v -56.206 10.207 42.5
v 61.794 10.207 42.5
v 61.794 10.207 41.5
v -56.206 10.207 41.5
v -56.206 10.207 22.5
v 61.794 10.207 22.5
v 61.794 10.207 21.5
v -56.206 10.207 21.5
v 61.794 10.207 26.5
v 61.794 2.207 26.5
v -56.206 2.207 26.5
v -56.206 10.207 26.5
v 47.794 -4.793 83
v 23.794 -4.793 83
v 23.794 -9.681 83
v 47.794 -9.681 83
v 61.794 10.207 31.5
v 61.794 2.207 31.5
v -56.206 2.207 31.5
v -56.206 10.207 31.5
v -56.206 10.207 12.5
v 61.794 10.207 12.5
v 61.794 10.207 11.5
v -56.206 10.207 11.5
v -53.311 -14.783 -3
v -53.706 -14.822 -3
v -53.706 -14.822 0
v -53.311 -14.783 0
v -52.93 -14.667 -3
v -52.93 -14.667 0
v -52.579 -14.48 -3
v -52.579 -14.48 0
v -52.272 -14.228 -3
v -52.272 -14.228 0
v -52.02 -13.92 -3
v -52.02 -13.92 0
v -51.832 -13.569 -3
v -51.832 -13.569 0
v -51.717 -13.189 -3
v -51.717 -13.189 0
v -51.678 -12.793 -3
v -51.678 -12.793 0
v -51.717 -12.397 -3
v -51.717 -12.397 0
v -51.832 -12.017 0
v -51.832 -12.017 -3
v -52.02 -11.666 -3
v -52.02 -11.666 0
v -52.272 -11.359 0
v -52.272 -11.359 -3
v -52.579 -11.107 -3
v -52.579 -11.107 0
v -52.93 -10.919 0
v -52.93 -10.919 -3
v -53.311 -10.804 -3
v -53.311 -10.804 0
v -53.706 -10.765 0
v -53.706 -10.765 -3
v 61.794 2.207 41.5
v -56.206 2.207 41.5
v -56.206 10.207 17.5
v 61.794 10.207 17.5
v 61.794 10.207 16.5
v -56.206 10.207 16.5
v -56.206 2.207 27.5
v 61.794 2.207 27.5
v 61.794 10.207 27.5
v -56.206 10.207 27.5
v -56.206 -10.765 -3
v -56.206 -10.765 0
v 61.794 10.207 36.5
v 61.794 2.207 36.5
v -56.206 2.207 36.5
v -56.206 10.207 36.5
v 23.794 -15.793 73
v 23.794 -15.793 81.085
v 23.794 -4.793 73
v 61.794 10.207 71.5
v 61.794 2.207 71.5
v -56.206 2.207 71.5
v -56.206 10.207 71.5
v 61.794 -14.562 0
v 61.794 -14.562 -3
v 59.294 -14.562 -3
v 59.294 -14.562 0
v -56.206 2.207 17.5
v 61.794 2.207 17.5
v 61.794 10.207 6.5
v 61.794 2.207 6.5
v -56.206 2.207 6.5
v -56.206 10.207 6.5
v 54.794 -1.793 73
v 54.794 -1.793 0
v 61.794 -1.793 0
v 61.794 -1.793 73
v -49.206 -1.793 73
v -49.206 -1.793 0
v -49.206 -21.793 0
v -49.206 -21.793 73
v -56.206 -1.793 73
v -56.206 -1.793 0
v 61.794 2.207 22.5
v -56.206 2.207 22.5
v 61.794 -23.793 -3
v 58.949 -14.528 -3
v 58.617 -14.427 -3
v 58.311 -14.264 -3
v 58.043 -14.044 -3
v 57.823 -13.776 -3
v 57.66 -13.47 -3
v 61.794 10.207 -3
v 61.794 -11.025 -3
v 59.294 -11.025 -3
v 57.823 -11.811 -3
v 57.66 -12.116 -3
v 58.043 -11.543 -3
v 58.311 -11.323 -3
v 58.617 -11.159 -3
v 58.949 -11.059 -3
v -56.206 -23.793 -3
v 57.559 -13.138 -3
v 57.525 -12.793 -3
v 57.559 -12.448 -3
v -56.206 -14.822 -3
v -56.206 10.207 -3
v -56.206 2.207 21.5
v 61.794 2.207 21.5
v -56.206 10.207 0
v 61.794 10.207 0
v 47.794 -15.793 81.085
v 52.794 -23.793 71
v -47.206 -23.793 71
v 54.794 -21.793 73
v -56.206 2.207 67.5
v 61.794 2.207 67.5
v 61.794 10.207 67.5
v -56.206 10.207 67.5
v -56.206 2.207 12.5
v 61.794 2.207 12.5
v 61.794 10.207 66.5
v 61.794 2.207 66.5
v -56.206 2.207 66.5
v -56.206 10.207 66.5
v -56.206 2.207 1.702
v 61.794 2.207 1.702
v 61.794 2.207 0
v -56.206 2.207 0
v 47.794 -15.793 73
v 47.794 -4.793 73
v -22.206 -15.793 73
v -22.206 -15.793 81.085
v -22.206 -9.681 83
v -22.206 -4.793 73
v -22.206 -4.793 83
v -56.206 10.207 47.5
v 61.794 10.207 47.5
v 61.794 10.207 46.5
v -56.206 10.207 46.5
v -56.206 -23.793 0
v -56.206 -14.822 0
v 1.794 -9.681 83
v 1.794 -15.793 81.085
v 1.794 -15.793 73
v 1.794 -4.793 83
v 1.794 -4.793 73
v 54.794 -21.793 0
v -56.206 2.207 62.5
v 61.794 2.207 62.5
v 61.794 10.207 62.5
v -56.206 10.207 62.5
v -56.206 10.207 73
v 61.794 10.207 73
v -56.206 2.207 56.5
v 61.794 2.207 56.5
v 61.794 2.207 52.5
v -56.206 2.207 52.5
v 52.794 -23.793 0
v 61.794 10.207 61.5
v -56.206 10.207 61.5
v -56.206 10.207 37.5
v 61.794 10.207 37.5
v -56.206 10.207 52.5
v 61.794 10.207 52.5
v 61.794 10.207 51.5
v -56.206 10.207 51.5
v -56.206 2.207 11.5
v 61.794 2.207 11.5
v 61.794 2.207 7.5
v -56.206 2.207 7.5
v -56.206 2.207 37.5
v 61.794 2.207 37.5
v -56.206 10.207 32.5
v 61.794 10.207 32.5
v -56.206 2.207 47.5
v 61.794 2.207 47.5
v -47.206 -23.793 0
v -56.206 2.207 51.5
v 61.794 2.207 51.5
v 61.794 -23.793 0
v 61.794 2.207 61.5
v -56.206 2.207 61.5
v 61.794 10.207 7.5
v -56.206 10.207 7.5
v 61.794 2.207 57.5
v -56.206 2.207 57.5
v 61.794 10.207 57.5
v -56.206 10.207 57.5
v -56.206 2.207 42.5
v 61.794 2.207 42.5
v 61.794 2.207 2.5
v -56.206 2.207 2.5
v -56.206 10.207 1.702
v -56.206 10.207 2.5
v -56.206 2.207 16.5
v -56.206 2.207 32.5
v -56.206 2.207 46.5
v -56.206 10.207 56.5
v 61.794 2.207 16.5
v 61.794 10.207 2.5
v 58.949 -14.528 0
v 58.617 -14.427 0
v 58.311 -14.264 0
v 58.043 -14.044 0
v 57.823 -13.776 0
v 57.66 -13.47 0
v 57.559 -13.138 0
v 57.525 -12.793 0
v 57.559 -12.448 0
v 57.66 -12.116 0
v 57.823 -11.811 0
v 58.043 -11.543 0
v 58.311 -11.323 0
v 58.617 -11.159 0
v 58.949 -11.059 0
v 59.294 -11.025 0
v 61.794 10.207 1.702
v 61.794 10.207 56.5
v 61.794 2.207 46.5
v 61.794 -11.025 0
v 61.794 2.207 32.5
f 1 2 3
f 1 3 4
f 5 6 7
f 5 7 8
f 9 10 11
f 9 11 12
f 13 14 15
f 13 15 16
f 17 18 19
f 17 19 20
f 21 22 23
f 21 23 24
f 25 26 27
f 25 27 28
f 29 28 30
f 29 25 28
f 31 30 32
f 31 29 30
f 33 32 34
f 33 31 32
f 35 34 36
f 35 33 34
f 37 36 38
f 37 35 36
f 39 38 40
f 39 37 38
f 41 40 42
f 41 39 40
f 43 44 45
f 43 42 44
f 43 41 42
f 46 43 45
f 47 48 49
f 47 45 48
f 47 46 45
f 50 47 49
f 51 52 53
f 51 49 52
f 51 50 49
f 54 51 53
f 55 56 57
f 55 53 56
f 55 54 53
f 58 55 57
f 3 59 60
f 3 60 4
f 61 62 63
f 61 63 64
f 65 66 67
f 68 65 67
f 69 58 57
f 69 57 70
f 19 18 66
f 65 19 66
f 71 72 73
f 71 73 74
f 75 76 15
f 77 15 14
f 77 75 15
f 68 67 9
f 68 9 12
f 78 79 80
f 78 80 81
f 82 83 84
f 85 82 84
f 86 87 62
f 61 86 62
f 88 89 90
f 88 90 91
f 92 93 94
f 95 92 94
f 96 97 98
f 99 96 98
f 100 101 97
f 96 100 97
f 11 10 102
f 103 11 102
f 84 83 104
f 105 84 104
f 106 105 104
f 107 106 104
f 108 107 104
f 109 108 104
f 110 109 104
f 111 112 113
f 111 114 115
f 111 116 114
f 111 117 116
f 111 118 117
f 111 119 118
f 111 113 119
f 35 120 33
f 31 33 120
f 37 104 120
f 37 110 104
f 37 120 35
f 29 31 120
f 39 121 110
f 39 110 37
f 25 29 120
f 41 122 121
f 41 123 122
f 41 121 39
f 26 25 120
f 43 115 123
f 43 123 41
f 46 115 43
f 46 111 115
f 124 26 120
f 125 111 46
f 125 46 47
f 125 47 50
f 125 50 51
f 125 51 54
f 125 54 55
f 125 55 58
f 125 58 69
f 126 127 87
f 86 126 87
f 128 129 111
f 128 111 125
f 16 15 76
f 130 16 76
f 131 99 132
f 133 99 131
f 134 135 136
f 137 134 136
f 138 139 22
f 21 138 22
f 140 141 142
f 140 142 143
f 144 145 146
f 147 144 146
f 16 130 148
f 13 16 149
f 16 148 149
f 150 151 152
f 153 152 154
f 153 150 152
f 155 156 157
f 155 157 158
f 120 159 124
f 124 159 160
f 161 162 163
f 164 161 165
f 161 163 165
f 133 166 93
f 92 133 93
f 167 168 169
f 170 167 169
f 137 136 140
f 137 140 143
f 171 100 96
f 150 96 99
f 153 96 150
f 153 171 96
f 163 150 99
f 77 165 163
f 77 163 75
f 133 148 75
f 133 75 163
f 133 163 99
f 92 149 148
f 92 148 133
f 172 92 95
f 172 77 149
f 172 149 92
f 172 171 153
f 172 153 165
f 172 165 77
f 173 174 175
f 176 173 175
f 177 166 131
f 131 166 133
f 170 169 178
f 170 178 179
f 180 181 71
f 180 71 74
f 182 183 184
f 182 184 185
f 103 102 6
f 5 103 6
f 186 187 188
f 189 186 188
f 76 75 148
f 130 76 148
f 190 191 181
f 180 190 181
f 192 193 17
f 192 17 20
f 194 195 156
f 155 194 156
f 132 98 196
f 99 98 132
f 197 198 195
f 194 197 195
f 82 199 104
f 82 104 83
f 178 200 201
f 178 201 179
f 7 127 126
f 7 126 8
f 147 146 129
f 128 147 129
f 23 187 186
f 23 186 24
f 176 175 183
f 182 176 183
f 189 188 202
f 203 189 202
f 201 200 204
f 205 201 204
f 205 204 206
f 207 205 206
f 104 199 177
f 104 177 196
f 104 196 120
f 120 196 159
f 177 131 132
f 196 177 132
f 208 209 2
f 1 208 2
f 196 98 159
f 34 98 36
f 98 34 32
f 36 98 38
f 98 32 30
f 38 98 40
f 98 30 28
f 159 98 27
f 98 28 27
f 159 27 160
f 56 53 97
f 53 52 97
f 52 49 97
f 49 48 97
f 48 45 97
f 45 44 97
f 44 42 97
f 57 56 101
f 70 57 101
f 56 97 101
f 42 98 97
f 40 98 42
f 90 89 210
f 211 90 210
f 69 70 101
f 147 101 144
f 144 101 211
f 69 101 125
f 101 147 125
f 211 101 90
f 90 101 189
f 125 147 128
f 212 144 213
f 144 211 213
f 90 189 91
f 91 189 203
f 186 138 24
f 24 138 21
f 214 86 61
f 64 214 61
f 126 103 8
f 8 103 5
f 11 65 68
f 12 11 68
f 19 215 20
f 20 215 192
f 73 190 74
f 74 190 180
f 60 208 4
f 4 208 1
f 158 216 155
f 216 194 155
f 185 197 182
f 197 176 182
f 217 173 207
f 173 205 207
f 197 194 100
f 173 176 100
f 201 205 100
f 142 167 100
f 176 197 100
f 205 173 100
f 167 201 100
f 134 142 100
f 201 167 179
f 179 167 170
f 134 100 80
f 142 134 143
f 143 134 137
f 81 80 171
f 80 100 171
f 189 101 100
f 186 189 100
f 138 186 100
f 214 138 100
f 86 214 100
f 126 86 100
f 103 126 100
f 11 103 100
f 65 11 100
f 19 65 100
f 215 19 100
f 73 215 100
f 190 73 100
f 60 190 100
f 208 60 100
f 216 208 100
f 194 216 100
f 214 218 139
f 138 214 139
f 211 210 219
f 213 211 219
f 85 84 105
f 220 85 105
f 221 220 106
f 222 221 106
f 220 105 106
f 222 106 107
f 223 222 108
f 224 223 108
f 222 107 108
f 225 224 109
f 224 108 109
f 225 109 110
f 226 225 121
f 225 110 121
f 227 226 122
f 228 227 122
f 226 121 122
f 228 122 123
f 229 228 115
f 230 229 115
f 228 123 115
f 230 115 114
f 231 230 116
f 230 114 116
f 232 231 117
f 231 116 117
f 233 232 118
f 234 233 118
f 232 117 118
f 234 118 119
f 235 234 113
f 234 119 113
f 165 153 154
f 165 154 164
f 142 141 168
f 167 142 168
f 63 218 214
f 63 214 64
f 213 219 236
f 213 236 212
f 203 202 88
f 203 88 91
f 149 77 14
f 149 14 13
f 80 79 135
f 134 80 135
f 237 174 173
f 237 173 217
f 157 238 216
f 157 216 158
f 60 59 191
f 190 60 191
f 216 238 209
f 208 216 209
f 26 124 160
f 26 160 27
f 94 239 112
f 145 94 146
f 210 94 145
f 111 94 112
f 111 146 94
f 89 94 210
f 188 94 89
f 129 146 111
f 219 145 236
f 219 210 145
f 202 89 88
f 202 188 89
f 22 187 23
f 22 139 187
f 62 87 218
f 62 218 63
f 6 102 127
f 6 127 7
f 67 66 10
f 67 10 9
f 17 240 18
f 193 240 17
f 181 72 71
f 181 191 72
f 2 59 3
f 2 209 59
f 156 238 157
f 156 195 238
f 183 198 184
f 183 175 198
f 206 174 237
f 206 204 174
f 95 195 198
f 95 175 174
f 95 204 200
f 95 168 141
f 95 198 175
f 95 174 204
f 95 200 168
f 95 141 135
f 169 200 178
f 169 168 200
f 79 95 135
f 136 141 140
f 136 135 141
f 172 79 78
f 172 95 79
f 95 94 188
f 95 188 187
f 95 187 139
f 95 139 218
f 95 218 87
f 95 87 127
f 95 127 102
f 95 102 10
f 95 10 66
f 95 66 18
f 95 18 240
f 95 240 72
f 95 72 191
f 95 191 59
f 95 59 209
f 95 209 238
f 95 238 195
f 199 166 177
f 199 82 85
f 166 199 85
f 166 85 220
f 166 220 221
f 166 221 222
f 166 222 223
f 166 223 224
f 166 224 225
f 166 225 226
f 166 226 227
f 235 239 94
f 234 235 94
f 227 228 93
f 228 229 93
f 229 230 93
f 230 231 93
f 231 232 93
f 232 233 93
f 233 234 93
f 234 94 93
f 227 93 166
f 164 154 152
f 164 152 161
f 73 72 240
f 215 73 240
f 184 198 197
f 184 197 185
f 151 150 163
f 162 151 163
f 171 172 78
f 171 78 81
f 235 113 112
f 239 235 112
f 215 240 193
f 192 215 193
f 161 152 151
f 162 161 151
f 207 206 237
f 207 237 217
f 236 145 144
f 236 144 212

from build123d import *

# Parameters (mm, degrees)
EXTRUDE_1_DEPTH     = 73
SKETCH_2_W          = 118
SKETCH_2_H          = 34
EXTRUDE_2_DEPTH     = 3
SKETCH_3_W          = 4
SKETCH_3_H          = 8
SKETCH_3_W_2        = 1.701544984
CUT_EXTRUDE_1_DEPTH = 122
SKETCH_4_W          = 24
SKETCH_4_H          = 11
EXTRUDE_3_DEPTH     = 10
CUT_EXTRUDE_2_DEPTH = 72
CUT_EXTRUDE_3_DEPTH = 5
CHAMFER_1_SIZE      = 2


with BuildPart() as part:
    # Эскиз1 → Бобышка-Вытянуть1 (new body)
    with BuildSketch(Plane.XY):
        Polygon((-49.206262386, -23.793189369), (54.793737614, -23.793189369), (54.793737614, -1.793189369), (61.793737614, -1.793189369), (61.793737614, 10.206810631), (-56.206262386, 10.206810631), (-56.206262386, -1.793189369), (-49.206262386, -1.793189369), align=None)
    extrude(amount=EXTRUDE_1_DEPTH)

    # Эскиз2 → Бобышка-Вытянуть2 (add)
    with BuildSketch(Plane(origin=(0, 0, 0), x_dir=(-1, 0, 0), z_dir=(0, 0, -1))):
        with Locations((-2.793737614, -6.793189369)):
            Rectangle(SKETCH_2_W, SKETCH_2_H)
    extrude(amount=EXTRUDE_2_DEPTH)

    # Эскиз3 → Вырез-Вытянуть1 (cut)
    with BuildSketch(Plane(origin=(61.793737614, 0, 0), x_dir=(0, 0, -1), z_dir=(1, 0, 0))):
        with Locations((-69.5, 6.206810631)):
            Rectangle(SKETCH_3_W, SKETCH_3_H)
        with Locations((-64.5, 6.206810631)):
            Rectangle(SKETCH_3_W, SKETCH_3_H)
        with Locations((-59.5, 6.206810631)):
            Rectangle(SKETCH_3_W, SKETCH_3_H)
        with Locations((-54.5, 6.206810631)):
            Rectangle(SKETCH_3_W, SKETCH_3_H)
        with Locations((-49.5, 6.206810631)):
            Rectangle(SKETCH_3_W, SKETCH_3_H)
        with Locations((-44.5, 6.206810631)):
            Rectangle(SKETCH_3_W, SKETCH_3_H)
        with Locations((-39.5, 6.206810631)):
            Rectangle(SKETCH_3_W, SKETCH_3_H)
        with Locations((-34.5, 6.206810631)):
            Rectangle(SKETCH_3_W, SKETCH_3_H)
        with Locations((-29.5, 6.206810631)):
            Rectangle(SKETCH_3_W, SKETCH_3_H)
        with Locations((-24.5, 6.206810631)):
            Rectangle(SKETCH_3_W, SKETCH_3_H)
        with Locations((-19.5, 6.206810631)):
            Rectangle(SKETCH_3_W, SKETCH_3_H)
        with Locations((-14.5, 6.206810631)):
            Rectangle(SKETCH_3_W, SKETCH_3_H)
        with Locations((-9.5, 6.206810631)):
            Rectangle(SKETCH_3_W, SKETCH_3_H)
        with Locations((-4.5, 6.206810631)):
            Rectangle(SKETCH_3_W, SKETCH_3_H)
        with Locations((-0.850772492, 6.206810631)):
            Rectangle(SKETCH_3_W_2, SKETCH_3_H)
    extrude(amount=-CUT_EXTRUDE_1_DEPTH, mode=Mode.SUBTRACT)

    # Эскиз4 → Бобышка-Вытянуть3 (add)
    with BuildSketch(Plane.XY.offset(73)):
        with Locations((35.793737614, -10.293189369)):
            Rectangle(SKETCH_4_W, SKETCH_4_H)
        with Locations((-10.206262386, -10.293189369)):
            Rectangle(SKETCH_4_W, SKETCH_4_H)
    extrude(amount=EXTRUDE_3_DEPTH)

    # Эскиз5 → Вырез-Вытянуть2 (cut)
    with BuildSketch(Plane.ZY.offset(22.206262386)):
        Polygon((83, -4.793189369), (83, -9.681423082), (81.084531501, -15.793189369), (84.818796285, -15.793189369), (84.818796285, -4.793189369), align=None)
    extrude(amount=-CUT_EXTRUDE_2_DEPTH, mode=Mode.SUBTRACT)

    # Эскиз6 → Вырез-Вытянуть3 (cut)
    with BuildSketch(Plane(origin=(0, 0, -3), x_dir=(-1, 0, 0), z_dir=(0, 0, -1))):
        with BuildLine():
            Line((-59.293737614, -11.024578472), (-61.793737614, -11.024578472))
            Line((-61.793737614, -11.024578472), (-61.793737614, -14.561800266))
            Line((-61.793737614, -14.561800266), (-59.293737614, -14.561800266))
            ThreePointArc((-59.293737614, -14.561800266), (-57.525126717, -12.793189369), (-59.293737614, -11.024578472))
        make_face()
        with BuildLine():
            Line((53.706262386, -10.764633874), (56.206262386, -10.764633874))
            Line((56.206262386, -10.764633874), (56.206262386, -14.821744863))
            Line((56.206262386, -14.821744863), (53.706262386, -14.821744863))
            ThreePointArc((53.706262386, -14.821744863), (51.677706891, -12.793189369), (53.706262386, -10.764633874))
        make_face()
    extrude(amount=-CUT_EXTRUDE_3_DEPTH, mode=Mode.SUBTRACT)

    # Фаска1
    chamfer_1_edges = [part.edges().sort_by_distance(p)[0] for p in [
        (54.793737614, -23.793189369, 36.5),
        (2.793737614, -23.793189369, 73),
        (-49.206262386, -23.793189369, 36.5),
    ]]
    chamfer(chamfer_1_edges, length=CHAMFER_1_SIZE)


solid = part.part
